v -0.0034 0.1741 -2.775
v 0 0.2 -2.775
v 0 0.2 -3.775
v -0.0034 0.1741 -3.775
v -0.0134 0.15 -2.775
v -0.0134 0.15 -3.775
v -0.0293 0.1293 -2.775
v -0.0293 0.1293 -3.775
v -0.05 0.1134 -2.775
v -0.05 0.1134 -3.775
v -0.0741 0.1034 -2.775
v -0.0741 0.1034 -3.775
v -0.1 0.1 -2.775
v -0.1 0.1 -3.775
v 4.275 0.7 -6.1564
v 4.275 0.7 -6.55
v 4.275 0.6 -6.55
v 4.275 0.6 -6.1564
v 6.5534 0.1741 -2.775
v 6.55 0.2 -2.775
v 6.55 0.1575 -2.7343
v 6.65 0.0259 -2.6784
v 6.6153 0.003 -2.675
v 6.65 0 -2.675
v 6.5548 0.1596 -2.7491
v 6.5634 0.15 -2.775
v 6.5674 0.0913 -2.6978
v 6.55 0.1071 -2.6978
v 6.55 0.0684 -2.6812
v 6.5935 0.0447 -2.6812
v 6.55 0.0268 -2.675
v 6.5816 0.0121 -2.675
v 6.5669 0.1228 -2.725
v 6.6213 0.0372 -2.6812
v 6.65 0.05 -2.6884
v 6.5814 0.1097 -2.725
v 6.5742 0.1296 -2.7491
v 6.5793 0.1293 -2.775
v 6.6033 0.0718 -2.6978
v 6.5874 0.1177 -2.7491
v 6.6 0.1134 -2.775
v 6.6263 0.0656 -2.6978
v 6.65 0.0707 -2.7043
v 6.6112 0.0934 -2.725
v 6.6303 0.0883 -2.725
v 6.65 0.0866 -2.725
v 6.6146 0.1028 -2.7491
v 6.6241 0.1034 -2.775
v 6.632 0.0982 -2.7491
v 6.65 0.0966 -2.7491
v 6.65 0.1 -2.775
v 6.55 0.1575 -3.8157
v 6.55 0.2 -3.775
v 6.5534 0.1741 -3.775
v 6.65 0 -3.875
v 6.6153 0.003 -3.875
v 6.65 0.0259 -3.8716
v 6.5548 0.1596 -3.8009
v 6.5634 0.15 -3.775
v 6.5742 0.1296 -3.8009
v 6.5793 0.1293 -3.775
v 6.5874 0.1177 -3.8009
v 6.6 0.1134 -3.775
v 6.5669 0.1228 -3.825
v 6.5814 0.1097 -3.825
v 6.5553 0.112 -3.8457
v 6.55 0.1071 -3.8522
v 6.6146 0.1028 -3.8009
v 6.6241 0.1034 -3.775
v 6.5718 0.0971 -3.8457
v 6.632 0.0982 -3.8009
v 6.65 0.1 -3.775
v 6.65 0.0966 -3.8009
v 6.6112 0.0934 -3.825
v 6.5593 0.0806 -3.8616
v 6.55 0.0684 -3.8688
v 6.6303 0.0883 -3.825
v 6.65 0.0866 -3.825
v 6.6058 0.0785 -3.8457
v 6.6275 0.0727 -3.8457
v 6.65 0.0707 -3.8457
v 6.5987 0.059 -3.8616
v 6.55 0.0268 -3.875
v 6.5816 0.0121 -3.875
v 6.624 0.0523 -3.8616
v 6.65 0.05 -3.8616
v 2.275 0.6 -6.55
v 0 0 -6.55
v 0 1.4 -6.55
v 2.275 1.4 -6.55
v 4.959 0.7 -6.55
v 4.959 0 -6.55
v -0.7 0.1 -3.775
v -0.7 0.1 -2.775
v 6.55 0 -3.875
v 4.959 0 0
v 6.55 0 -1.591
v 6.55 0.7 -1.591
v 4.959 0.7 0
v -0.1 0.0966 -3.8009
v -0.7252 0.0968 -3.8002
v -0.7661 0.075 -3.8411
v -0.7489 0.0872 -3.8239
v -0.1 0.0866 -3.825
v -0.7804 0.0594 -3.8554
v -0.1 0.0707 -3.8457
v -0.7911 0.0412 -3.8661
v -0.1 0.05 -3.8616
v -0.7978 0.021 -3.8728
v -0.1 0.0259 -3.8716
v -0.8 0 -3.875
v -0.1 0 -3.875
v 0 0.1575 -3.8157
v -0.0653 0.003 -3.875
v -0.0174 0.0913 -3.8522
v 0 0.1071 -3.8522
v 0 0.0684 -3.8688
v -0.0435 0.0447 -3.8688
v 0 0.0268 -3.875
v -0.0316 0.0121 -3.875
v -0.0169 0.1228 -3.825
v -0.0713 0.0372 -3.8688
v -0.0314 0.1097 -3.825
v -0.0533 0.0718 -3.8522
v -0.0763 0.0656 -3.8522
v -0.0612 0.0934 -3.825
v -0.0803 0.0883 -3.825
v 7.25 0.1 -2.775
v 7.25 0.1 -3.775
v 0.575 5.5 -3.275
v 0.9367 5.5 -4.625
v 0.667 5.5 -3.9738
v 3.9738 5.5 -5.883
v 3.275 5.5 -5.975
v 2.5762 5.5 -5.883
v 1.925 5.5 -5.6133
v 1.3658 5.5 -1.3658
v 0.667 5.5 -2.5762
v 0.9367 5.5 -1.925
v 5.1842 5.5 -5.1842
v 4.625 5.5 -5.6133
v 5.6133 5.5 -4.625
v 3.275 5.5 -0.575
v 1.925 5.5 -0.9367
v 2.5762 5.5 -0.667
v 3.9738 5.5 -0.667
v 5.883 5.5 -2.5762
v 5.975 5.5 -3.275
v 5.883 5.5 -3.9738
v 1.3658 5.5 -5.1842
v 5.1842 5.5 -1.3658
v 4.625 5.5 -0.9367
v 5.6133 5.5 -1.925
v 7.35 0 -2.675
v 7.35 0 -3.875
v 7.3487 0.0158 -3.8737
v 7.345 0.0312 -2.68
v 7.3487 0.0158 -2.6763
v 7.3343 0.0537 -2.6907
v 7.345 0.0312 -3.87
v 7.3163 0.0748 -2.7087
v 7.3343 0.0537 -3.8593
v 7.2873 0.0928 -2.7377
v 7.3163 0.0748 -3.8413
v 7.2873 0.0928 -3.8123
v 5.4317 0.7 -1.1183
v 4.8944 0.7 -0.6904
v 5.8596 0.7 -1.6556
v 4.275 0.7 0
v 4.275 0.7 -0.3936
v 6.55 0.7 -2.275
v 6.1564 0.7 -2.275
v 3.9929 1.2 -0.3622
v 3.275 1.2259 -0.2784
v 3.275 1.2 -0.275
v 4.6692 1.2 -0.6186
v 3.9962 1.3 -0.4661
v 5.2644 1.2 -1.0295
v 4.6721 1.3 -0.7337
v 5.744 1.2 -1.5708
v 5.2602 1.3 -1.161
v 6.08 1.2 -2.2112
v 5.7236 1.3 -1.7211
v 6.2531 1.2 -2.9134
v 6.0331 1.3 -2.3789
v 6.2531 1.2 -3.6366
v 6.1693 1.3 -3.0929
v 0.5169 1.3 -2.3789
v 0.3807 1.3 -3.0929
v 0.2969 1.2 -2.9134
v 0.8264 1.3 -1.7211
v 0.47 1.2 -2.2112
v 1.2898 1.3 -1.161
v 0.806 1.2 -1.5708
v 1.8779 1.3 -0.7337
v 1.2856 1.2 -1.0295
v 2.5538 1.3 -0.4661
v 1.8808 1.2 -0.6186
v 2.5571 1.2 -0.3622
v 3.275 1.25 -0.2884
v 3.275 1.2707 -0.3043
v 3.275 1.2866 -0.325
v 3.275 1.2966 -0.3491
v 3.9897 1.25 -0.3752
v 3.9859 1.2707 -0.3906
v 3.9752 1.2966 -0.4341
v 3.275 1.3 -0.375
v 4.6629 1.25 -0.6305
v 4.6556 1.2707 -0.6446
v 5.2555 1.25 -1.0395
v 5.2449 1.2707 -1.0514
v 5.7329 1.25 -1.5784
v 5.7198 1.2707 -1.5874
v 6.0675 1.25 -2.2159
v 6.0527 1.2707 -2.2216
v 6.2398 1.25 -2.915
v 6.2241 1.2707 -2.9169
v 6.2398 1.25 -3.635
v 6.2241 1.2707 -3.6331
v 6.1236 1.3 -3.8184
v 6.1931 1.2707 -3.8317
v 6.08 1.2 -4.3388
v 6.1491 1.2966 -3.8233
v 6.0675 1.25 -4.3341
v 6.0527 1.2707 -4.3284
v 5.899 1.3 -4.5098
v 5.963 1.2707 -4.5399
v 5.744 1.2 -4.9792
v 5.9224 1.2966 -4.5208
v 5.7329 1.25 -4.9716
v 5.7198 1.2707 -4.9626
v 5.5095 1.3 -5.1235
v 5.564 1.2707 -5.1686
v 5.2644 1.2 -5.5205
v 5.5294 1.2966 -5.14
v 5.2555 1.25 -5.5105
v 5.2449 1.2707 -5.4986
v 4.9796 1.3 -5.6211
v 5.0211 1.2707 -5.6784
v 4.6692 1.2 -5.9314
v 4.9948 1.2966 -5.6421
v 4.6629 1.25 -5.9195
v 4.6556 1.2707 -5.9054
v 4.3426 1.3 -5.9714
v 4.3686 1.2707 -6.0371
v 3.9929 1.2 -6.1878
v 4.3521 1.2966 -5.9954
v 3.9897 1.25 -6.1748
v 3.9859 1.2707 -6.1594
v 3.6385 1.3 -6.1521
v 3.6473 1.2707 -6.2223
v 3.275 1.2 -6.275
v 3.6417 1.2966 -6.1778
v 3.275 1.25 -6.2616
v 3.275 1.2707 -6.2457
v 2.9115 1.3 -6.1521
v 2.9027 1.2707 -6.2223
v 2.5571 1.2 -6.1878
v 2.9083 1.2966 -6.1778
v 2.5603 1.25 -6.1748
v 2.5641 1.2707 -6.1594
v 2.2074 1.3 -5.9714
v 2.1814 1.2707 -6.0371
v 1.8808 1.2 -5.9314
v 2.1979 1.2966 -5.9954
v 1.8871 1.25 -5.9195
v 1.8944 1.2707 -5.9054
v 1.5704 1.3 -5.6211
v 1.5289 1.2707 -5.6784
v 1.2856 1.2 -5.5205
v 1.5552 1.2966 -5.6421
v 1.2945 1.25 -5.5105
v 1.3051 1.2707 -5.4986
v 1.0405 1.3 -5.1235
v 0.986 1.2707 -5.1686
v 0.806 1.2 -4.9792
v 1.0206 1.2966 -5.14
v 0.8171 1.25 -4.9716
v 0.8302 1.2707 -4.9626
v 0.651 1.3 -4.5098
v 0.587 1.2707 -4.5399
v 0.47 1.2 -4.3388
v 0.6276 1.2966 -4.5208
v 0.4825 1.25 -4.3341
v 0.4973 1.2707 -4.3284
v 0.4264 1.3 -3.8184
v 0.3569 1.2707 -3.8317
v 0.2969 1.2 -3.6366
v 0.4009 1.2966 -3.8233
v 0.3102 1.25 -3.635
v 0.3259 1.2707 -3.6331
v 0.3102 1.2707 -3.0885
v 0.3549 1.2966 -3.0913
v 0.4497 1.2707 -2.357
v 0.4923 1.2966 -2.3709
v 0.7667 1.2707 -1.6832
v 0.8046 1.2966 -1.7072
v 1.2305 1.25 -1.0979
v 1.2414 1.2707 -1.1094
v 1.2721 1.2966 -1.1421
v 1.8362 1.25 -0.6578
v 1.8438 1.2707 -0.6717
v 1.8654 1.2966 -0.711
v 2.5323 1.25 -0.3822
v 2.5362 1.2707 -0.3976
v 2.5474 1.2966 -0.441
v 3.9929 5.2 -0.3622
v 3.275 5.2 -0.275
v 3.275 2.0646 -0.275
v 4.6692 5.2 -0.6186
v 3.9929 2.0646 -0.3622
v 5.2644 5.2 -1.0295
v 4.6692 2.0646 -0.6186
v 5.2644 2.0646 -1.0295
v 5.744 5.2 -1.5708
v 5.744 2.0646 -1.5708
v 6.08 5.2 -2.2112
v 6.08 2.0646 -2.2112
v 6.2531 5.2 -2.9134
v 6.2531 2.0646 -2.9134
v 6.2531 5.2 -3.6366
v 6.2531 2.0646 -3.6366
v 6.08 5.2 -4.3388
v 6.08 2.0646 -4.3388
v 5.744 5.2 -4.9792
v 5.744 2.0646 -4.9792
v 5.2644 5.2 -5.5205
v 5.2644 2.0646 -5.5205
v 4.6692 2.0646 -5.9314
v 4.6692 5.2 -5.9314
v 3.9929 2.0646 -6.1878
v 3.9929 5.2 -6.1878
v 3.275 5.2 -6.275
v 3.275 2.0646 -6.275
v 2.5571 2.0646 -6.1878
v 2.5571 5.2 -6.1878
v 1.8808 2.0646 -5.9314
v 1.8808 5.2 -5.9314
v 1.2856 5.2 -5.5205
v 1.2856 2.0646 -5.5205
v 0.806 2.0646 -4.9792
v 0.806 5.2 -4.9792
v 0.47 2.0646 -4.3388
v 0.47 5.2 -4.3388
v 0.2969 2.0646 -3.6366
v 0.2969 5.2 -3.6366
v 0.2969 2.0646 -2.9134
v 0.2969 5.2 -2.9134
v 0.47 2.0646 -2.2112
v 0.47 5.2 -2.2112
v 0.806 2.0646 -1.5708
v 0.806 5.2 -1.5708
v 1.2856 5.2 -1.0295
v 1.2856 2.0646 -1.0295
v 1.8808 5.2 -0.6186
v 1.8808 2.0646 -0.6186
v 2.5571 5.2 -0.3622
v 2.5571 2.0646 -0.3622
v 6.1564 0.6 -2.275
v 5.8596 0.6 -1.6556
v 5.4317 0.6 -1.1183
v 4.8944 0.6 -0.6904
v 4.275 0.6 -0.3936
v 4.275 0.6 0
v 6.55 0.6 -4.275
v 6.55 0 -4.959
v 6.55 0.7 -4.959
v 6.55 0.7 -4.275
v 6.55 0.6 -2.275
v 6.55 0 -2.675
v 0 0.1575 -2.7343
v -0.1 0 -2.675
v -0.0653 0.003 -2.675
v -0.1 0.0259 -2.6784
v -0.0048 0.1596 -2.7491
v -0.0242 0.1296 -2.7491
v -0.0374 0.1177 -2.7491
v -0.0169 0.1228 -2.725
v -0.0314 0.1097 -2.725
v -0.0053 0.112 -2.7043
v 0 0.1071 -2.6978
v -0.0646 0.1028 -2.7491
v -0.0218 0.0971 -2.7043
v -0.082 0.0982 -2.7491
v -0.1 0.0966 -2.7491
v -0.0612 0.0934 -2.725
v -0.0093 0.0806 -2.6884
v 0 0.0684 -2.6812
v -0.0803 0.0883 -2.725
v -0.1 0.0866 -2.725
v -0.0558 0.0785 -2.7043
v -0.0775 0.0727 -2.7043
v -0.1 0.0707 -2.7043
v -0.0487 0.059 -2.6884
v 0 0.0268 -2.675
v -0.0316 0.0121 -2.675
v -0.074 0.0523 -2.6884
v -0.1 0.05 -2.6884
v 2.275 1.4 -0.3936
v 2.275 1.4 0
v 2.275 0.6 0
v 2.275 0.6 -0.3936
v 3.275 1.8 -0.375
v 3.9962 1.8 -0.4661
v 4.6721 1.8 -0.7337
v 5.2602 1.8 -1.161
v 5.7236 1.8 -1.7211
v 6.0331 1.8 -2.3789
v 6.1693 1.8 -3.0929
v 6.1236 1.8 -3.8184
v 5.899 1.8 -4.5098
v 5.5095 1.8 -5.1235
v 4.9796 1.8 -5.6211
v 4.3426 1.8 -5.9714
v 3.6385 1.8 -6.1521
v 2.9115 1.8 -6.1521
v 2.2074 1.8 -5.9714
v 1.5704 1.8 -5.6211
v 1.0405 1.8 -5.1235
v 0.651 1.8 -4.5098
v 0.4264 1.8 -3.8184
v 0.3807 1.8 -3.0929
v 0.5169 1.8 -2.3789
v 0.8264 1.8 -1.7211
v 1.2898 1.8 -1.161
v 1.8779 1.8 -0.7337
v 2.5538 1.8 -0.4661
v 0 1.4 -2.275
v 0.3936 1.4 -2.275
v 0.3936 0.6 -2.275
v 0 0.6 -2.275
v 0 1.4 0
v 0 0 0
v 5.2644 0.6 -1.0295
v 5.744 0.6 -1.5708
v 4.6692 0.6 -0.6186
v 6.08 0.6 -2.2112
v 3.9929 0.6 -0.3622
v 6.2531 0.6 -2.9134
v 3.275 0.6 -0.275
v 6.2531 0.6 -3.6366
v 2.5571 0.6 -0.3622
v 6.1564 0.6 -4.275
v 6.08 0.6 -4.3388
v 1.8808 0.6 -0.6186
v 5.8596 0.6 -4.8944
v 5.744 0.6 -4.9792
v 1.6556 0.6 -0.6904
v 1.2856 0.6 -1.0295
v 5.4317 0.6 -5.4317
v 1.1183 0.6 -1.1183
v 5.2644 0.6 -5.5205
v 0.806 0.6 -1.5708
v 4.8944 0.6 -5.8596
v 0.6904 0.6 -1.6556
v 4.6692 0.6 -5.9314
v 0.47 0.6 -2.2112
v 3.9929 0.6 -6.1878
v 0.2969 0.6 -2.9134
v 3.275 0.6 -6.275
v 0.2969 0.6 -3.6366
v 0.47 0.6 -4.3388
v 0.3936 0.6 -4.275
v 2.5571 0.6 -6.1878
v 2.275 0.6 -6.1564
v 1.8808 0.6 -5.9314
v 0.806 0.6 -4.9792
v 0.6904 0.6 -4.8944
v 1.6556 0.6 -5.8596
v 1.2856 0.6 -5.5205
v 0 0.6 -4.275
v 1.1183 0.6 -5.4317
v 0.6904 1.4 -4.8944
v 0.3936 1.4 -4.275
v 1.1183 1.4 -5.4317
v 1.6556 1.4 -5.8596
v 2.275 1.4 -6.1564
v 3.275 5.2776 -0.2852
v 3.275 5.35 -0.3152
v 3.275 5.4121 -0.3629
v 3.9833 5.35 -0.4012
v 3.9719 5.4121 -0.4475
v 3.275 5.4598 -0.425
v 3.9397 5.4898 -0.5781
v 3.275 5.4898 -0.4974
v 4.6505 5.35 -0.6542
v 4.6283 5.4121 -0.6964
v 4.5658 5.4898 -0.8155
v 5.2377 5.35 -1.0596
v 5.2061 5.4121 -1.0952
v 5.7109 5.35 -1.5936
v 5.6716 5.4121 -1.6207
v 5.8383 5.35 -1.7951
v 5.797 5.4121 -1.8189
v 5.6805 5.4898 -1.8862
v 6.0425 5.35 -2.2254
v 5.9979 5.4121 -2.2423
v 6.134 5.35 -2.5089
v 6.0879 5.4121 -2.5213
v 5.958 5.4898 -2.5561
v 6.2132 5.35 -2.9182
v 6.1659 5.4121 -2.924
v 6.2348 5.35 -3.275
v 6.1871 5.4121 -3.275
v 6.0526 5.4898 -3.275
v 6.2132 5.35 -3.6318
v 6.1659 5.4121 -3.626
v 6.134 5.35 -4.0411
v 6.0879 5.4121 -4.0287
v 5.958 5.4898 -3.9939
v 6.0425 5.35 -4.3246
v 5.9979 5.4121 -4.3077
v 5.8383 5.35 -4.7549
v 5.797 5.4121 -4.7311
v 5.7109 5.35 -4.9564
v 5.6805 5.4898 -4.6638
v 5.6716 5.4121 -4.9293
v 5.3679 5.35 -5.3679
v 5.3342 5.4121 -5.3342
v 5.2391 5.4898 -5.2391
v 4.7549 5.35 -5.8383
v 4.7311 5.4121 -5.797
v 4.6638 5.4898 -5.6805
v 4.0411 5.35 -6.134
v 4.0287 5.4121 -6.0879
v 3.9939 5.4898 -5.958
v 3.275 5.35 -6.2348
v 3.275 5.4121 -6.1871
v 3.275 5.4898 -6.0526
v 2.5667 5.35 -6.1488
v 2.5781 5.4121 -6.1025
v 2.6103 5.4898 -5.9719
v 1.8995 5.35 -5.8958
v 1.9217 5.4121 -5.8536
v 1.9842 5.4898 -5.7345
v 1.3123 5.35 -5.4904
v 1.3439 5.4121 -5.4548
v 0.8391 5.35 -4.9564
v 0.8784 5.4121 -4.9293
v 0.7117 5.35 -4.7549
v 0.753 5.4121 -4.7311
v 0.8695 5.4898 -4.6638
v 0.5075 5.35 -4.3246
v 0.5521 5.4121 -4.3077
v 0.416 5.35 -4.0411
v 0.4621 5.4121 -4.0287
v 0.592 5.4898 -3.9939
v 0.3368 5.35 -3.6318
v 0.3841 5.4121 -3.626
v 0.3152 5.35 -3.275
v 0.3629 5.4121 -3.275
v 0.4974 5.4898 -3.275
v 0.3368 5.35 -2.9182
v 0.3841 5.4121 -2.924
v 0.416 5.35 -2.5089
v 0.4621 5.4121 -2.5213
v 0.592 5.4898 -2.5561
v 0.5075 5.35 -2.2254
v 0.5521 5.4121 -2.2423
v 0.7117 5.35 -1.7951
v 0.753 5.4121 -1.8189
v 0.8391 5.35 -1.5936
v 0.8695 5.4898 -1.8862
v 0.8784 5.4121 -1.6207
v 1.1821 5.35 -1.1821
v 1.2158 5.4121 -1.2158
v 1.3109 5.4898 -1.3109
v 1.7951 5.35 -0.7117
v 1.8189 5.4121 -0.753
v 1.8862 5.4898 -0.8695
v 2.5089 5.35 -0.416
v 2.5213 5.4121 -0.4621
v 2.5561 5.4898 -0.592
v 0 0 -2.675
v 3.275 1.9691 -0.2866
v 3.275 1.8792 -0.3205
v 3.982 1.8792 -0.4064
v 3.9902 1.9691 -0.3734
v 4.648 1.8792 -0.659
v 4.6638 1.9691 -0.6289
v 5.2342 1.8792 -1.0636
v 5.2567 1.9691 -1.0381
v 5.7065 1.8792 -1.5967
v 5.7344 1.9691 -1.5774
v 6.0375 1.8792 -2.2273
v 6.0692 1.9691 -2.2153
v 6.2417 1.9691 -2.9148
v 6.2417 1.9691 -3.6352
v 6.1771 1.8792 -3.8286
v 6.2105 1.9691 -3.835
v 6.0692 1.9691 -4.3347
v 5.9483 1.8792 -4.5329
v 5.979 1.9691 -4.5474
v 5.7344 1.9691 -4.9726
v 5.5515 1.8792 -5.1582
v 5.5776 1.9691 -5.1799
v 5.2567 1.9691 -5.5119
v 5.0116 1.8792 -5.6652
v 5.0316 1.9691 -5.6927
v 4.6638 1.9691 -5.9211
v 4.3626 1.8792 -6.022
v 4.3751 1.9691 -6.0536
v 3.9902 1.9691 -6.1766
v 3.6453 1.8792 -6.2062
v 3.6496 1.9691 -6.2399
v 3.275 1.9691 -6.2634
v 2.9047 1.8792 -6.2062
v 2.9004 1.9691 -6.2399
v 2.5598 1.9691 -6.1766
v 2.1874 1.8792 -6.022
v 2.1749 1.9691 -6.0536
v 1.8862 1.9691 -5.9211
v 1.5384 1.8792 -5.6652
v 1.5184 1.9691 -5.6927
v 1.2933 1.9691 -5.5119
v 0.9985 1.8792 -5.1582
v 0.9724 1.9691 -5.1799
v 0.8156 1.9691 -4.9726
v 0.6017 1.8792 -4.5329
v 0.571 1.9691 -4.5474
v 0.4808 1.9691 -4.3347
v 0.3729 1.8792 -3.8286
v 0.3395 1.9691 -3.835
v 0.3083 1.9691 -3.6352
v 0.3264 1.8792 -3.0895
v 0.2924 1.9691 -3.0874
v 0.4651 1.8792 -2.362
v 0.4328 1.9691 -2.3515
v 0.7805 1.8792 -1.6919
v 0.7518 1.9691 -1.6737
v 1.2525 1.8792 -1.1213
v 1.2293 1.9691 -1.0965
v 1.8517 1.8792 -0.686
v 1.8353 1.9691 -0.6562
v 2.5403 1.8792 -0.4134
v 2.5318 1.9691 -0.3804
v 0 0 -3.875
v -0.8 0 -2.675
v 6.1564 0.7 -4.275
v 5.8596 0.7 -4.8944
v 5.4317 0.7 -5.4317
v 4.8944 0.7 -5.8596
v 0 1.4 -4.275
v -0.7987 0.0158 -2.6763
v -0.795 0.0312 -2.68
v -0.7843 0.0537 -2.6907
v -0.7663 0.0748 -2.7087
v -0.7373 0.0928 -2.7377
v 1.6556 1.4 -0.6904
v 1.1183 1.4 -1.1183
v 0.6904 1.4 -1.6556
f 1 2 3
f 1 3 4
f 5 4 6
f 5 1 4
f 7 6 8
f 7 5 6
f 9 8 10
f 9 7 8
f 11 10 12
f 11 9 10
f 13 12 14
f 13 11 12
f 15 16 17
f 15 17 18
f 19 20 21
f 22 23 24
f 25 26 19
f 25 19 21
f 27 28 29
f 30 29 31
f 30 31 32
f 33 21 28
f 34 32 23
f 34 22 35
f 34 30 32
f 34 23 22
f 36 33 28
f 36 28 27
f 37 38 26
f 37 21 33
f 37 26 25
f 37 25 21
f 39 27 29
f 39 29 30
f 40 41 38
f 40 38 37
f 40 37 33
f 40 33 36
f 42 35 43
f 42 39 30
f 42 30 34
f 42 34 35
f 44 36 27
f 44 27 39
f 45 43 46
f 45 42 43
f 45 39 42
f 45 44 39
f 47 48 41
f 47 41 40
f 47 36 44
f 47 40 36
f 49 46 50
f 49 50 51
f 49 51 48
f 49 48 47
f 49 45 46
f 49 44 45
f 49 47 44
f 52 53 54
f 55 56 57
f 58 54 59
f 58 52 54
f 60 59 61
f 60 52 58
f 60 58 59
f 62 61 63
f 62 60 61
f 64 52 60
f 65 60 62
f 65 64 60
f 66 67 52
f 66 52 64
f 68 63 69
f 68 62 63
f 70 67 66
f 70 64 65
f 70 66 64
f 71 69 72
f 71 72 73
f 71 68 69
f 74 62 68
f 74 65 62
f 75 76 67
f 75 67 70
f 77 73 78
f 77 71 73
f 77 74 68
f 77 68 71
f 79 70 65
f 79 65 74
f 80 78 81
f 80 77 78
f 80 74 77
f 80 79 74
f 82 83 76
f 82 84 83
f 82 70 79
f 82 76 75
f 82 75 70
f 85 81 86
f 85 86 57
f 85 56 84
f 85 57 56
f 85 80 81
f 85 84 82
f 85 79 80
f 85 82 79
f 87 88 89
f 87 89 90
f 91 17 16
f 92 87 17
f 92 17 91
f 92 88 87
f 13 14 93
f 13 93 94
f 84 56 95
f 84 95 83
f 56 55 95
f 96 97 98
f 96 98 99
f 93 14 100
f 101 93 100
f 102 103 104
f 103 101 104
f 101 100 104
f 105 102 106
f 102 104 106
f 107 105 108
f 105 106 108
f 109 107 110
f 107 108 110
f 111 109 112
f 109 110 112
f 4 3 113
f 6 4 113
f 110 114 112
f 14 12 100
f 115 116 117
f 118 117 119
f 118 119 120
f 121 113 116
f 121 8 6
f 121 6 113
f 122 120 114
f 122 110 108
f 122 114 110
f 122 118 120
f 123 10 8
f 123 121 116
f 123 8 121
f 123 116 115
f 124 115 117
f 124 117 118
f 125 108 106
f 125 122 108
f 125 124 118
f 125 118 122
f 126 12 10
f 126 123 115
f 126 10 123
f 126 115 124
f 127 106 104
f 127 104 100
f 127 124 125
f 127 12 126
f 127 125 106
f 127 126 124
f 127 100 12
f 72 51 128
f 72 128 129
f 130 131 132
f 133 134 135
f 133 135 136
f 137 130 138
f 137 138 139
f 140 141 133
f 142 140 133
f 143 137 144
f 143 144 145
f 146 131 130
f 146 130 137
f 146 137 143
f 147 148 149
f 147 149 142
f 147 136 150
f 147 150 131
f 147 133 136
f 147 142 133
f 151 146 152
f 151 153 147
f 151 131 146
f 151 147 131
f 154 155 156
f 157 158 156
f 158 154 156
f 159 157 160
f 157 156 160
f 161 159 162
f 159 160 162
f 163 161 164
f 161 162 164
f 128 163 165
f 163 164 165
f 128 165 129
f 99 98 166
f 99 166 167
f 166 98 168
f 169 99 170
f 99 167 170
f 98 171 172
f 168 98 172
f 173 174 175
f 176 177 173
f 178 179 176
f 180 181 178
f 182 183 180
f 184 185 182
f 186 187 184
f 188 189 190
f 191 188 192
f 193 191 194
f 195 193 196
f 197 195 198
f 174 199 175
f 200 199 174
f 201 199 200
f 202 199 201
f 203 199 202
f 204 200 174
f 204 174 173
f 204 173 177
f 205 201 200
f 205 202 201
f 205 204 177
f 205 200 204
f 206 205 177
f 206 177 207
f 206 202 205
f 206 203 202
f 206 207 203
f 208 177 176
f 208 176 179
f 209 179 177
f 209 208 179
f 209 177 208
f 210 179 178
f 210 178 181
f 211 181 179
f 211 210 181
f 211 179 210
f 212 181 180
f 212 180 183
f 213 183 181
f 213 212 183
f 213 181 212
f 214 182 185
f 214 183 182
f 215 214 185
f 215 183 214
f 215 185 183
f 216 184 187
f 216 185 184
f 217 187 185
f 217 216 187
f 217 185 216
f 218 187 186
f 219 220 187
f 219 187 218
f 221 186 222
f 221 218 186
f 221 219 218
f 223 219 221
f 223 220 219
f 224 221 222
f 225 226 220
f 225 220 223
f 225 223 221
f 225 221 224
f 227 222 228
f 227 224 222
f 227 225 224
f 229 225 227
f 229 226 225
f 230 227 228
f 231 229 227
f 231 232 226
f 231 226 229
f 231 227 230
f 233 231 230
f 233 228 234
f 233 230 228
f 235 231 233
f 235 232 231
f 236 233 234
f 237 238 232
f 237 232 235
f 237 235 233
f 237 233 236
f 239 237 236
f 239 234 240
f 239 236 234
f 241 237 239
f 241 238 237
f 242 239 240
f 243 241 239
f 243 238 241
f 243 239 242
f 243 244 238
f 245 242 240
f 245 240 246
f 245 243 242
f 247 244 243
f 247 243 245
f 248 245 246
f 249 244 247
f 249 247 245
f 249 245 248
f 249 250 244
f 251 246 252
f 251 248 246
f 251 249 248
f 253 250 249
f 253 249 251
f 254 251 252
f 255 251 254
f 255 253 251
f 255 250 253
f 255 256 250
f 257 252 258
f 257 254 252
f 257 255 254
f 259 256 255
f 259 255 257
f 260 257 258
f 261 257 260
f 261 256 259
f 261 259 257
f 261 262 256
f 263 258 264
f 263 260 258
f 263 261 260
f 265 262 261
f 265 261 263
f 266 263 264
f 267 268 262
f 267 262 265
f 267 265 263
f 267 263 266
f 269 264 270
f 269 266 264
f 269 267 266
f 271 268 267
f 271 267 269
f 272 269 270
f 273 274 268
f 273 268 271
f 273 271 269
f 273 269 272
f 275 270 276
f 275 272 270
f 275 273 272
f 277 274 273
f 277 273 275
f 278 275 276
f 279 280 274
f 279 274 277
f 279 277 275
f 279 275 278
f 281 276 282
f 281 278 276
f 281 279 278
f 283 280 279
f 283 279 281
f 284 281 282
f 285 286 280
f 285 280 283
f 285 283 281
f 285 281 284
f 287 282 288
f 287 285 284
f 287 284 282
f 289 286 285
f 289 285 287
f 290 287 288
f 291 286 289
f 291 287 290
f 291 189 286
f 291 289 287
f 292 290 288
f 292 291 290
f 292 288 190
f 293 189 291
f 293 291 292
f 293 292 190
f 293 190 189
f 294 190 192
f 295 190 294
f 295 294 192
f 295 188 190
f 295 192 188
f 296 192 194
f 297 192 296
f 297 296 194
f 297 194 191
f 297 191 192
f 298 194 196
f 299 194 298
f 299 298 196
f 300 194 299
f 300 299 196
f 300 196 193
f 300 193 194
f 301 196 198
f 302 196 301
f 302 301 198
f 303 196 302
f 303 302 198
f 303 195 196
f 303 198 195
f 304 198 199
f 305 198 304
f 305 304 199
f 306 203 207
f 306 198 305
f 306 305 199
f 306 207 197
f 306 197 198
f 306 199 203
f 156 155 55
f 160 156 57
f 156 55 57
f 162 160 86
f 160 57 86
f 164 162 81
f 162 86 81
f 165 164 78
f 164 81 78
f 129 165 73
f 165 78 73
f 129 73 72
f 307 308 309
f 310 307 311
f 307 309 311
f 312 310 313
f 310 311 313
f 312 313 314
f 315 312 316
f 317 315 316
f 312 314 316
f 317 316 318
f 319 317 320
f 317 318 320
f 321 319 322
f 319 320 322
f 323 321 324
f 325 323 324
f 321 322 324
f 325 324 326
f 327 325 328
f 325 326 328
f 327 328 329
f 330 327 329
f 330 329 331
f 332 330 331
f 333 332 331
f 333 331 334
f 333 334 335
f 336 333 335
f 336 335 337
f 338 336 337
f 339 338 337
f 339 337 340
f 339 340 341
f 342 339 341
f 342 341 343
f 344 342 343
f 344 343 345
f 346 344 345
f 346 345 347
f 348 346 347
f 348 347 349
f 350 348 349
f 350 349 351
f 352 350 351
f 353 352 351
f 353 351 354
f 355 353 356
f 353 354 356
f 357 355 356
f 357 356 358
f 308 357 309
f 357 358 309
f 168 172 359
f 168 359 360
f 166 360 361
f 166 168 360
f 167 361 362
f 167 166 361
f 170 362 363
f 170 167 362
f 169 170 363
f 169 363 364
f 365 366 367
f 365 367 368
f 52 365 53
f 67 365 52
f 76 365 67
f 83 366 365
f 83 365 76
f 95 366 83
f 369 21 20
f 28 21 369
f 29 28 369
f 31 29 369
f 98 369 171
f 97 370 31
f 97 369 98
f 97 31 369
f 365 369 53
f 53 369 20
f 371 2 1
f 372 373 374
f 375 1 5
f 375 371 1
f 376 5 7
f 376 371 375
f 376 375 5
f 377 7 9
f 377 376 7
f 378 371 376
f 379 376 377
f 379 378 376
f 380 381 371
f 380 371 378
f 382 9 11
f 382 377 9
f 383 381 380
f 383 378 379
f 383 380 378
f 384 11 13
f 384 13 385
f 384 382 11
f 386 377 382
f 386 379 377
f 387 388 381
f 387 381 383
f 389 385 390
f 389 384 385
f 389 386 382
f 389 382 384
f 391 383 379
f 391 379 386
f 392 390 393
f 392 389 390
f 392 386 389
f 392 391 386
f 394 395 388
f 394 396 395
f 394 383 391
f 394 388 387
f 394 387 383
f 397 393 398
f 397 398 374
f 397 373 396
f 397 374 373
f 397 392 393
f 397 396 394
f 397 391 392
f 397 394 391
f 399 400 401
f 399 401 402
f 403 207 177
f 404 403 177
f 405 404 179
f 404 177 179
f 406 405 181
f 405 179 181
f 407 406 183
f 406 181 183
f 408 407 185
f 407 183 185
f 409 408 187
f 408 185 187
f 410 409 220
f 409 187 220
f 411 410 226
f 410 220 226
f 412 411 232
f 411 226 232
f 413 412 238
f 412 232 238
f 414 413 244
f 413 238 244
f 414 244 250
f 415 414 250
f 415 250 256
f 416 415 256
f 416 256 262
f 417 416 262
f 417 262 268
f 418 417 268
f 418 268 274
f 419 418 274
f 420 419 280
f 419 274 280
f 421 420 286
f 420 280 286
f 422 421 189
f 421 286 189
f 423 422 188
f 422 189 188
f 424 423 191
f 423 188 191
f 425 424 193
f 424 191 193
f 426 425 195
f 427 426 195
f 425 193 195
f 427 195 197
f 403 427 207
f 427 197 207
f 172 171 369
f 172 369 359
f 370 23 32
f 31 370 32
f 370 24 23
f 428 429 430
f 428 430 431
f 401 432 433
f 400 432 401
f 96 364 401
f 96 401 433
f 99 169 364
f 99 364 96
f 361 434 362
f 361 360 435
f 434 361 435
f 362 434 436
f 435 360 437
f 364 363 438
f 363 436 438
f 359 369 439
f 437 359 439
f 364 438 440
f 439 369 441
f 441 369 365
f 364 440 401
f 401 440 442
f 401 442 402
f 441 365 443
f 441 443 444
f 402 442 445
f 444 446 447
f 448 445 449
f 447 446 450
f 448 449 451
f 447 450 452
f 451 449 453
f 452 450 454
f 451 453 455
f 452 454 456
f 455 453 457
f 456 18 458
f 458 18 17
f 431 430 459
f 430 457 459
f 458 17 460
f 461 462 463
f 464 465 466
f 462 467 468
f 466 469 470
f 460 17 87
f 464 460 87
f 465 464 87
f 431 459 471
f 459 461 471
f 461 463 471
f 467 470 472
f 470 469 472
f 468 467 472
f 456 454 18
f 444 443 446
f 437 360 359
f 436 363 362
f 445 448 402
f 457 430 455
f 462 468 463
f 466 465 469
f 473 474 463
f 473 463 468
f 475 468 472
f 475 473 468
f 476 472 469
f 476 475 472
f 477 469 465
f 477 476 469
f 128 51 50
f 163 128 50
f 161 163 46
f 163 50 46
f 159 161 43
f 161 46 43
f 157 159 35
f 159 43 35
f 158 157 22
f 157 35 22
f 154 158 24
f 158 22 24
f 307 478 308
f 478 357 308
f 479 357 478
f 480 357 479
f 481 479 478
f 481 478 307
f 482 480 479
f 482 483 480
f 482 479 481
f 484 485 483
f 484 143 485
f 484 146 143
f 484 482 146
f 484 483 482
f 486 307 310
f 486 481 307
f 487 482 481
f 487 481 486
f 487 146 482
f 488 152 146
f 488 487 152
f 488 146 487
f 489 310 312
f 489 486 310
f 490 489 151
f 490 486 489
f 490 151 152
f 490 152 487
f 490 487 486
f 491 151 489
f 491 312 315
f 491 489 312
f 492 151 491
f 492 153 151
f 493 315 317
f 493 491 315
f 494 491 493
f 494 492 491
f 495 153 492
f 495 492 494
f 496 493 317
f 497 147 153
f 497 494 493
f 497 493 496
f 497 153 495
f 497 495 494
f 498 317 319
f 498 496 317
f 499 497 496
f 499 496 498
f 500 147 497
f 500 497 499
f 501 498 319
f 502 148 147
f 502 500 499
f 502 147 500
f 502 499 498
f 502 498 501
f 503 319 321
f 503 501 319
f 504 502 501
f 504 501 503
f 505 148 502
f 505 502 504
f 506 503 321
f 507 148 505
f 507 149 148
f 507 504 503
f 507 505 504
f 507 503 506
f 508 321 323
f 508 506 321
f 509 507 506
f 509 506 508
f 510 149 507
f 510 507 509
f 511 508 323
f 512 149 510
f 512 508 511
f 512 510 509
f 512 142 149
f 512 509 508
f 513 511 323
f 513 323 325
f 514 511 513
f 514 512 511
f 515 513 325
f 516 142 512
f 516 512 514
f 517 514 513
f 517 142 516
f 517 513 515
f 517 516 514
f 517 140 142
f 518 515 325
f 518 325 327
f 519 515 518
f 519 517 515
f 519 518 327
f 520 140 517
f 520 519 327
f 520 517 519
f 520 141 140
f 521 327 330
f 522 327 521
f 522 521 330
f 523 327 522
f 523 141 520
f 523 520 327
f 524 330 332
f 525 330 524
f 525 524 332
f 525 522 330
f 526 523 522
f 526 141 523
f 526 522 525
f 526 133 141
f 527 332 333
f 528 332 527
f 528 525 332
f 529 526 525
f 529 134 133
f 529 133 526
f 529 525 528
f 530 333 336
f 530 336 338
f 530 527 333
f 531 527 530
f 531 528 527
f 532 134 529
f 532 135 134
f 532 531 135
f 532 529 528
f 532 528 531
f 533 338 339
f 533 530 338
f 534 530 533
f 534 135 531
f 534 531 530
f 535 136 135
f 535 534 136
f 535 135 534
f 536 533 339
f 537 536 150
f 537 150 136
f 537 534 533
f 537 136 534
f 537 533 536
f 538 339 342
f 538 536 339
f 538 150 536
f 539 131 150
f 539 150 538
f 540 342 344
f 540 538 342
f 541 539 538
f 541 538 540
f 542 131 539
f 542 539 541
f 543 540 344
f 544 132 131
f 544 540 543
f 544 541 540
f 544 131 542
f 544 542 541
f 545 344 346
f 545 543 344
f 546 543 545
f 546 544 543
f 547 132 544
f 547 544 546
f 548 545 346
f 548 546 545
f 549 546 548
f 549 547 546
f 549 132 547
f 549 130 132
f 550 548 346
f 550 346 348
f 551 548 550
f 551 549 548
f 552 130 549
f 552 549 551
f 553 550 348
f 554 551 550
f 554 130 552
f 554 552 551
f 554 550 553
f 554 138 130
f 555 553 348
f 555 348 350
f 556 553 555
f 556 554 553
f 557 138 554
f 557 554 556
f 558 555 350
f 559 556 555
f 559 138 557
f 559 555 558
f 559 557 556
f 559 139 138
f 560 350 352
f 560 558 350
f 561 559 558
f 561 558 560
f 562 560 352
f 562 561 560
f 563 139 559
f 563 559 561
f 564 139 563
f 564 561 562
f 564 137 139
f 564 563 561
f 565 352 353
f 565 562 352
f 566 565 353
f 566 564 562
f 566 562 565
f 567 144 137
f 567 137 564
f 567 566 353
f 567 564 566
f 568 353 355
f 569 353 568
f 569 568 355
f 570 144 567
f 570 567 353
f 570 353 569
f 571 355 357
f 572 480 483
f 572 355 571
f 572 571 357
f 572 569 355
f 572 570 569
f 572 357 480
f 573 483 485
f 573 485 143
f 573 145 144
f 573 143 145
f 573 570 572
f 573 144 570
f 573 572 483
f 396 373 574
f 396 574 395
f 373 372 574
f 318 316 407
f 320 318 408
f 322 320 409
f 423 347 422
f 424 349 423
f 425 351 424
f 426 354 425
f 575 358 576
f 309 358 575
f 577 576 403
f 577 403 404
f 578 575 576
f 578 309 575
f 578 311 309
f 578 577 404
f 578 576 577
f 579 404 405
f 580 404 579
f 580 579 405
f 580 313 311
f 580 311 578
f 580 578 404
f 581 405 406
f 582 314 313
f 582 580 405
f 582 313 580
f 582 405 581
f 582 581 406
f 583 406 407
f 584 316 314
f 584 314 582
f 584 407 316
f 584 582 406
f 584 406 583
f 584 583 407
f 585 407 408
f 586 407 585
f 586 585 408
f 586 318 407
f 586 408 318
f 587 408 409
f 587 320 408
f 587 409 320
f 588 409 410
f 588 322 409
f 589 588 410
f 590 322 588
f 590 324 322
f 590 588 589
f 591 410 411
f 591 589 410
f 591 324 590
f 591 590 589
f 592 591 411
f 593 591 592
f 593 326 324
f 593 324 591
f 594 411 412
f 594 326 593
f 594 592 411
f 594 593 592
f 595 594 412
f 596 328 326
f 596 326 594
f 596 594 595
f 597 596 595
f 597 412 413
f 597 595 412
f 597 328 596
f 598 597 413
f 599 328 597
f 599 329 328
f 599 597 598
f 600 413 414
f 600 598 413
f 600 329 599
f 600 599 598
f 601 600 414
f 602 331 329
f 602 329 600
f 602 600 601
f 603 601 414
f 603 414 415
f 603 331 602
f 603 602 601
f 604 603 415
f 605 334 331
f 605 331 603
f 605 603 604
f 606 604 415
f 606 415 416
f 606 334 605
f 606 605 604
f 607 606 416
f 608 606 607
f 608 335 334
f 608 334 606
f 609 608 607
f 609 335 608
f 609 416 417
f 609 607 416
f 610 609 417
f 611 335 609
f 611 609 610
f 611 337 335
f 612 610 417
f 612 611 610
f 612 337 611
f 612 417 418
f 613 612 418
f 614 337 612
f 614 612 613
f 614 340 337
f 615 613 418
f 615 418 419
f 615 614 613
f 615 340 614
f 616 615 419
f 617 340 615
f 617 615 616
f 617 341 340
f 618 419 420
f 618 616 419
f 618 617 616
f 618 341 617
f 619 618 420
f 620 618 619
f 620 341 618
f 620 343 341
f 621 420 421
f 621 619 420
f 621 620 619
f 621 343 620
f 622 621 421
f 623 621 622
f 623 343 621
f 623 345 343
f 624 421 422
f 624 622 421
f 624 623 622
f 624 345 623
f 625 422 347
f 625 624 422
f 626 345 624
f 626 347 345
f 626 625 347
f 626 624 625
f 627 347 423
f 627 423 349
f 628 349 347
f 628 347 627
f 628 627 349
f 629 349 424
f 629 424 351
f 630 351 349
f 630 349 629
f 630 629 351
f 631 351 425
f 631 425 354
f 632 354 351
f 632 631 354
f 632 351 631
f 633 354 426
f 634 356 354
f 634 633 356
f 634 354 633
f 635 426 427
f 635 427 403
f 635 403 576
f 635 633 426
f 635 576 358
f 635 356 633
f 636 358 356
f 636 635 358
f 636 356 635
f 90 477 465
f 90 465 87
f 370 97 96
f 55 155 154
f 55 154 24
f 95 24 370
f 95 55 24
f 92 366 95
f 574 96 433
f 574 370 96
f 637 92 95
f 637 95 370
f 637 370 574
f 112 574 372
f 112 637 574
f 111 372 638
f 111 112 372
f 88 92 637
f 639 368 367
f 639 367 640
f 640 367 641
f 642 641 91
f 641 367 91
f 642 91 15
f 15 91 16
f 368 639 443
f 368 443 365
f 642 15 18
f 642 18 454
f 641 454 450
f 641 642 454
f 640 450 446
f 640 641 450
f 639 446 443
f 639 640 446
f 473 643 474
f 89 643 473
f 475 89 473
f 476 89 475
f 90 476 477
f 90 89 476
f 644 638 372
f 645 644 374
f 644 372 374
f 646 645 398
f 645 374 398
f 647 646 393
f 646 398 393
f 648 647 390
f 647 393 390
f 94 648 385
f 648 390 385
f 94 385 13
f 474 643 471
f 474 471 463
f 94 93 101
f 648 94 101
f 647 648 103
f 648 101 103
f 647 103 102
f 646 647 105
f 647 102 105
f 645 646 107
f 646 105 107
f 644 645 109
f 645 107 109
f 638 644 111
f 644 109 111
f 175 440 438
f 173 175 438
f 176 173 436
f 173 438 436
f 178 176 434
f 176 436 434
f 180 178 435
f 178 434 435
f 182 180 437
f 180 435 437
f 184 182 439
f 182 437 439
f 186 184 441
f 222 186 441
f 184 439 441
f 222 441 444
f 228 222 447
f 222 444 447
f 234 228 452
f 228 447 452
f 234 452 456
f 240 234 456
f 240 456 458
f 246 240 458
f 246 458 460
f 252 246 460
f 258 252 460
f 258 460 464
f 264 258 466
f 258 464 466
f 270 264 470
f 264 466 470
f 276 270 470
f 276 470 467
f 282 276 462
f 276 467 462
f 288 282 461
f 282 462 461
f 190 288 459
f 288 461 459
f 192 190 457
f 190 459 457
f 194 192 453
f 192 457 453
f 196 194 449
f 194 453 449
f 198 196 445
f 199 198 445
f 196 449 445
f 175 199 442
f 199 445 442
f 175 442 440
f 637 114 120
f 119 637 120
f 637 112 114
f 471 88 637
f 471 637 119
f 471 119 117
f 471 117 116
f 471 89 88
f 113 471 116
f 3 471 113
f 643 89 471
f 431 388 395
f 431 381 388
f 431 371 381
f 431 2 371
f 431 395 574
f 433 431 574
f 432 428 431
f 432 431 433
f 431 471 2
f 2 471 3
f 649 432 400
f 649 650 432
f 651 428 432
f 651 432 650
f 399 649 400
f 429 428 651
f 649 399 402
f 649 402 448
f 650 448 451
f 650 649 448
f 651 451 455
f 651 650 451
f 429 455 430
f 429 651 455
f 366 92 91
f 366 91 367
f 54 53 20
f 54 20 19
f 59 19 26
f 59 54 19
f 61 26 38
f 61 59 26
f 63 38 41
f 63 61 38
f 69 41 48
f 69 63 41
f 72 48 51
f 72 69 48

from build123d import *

# Parameters (mm, degrees)
BOSS_EXTRU_1_DEPTH      = 0.7
ENL_V_MAT_EXTRU_1_DEPTH = 0.1
BOSS_EXTRU_2_START      = 0.7
BOSS_EXTRU_2_DEPTH      = 0.7
ESQUISSE4_R             = 3
BOSS_EXTRU_3_DEPTH      = 0.7
CONG_1_R                = 0.1
ESQUISSE5_R             = 2.9
BOSS_EXTRU_4_DEPTH      = 0.5
ESQUISSE6_R             = 3
BOSS_EXTRU_5_DEPTH      = 3.7
CONG_2_R                = 0.4
CONG_3_R                = 0.3
ESQUISSE7_W             = 1.2
ESQUISSE7_H             = 0.1
BOSS_EXTRU_6_DEPTH      = 0.8
CONG_4_R                = 0.1
CONG_5_R                = 0.1
ESQUISSE8_W             = 1.2
ESQUISSE8_H             = 0.1
BOSS_EXTRU_7_DEPTH      = 0.8
CONG_6_R                = 0.1
CONG_7_R                = 0.1


with BuildPart() as part:
    # Esquisse1 → Boss.-Extru.1 (new body)
    with BuildSketch(Plane(origin=(0, 0, 0), x_dir=(1, 0, 0), z_dir=(0, 1, 0))):
        Polygon((4.959009742, 6.55), (6.55, 4.959009742), (6.55, 1.590990258), (4.959009742, 0), (0, 0), (0, 6.55), align=None)
    extrude(amount=BOSS_EXTRU_1_DEPTH)

    # Esquisse2 → Enlèv. mat.-Extru.1 (cut)
    with BuildSketch(Plane(origin=(0, 0.7, 0), x_dir=(1, 0, 0), z_dir=(0, 1, 0))):
        with BuildLine():
            Line((2.275, 6.55), (4.275, 6.55))
            Line((4.275, 6.55), (4.275, 6.156405907))
            ThreePointArc((4.275, 6.156405907), (5.431675683, 5.431675683), (6.156405907, 4.275))
            Line((6.156405907, 4.275), (6.55, 4.275))
            Line((6.55, 4.275), (6.55, 2.275))
            Line((6.55, 2.275), (6.156405907, 2.275))
            ThreePointArc((6.156405907, 2.275), (5.431675683, 1.118324317), (4.275, 0.393594093))
            Line((4.275, 0.393594093), (4.275, 0))
            Line((4.275, 0), (2.275, 0))
            Line((2.275, 0), (2.275, 0.393594093))
            ThreePointArc((2.275, 0.393594093), (1.118324317, 1.118324317), (0.393594093, 2.275))
            Line((0.393594093, 2.275), (0, 2.275))
            Line((0, 2.275), (0, 4.275))
            Line((0, 4.275), (0.393594093, 4.275))
            ThreePointArc((0.393594093, 4.275), (1.118324317, 5.431675683), (2.275, 6.156405907))
            Line((2.275, 6.156405907), (2.275, 6.55))
        make_face()
    extrude(amount=-ENL_V_MAT_EXTRU_1_DEPTH, mode=Mode.SUBTRACT)

    # Esquisse3 → Boss.-Extru.2 (add)
    with BuildSketch(Plane(origin=(0, 0.7, 0), x_dir=(1, 0, 0), z_dir=(0, 1, 0)).offset(BOSS_EXTRU_2_START)):
        with BuildLine():
            Line((0, 0), (2.275, 0))
            Line((2.275, 0), (2.275, 0.393594093))
            ThreePointArc((2.275, 0.393594093), (1.118324317, 1.118324317), (0.393594093, 2.275))
            Line((0.393594093, 2.275), (0, 2.275))
            Line((0, 2.275), (0, 0))
        make_face()
        with BuildLine():
            Line((0, 6.55), (0, 4.275))
            Line((0, 4.275), (0.393594093, 4.275))
            ThreePointArc((0.393594093, 4.275), (1.118324317, 5.431675683), (2.275, 6.156405907))
            Line((2.275, 6.156405907), (2.275, 6.55))
            Line((2.275, 6.55), (0, 6.55))
        make_face()
    extrude(amount=-BOSS_EXTRU_2_DEPTH)

    # Esquisse4 → Boss.-Extru.3 (add)
    with BuildSketch(Plane(origin=(0, 0.6, 0), x_dir=(1, 0, 0), z_dir=(0, 1, 0))):
        with Locations(Location((3.275, 3.275, 0), (0, 0, 270))):
            Circle(ESQUISSE4_R)
    extrude(amount=BOSS_EXTRU_3_DEPTH)

    # Congé1
    cong_1_edges = [part.edges().sort_by_distance(p)[0] for p in [
        (3.275, 1.3, -6.275),
    ]]
    fillet(cong_1_edges, radius=CONG_1_R)

    # Esquisse5 → Boss.-Extru.4 (add)
    with BuildSketch(Plane(origin=(0, 1.3, 0), x_dir=(1, 0, 0), z_dir=(0, 1, 0))):
        with Locations(Location((3.275, 3.275, 0), (0, 0, 270))):
            Circle(ESQUISSE5_R)
    extrude(amount=BOSS_EXTRU_4_DEPTH)

    # Esquisse6 → Boss.-Extru.5 (add)
    with BuildSketch(Plane(origin=(0, 1.8, 0), x_dir=(1, 0, 0), z_dir=(0, 1, 0))):
        with Locations(Location((3.275, 3.275, 0), (0, 0, 270))):
            Circle(ESQUISSE6_R)
    extrude(amount=BOSS_EXTRU_5_DEPTH)

    # Congé2
    # the kernel refuses this fillet: 0.4 mm, written as the material it takes off along each edge
    with BuildSketch(Plane(origin=(3.275, 1.8, -3.275), x_dir=(0, 0, 1), z_dir=(-1, 0, 0))) as cong_2_piece_1:
        with BuildLine():
            CenterArc((2.6, 0.264575131), CONG_2_R, 318.590377891, 41.409622109)
            Line((2.9, 0), (2.906, -0.005291503))
            ThreePointArc((2.906, -0.005291503), (2.95, -0.008), (3, -0.008))
            Line((3, -0.008), (3.008, 0))
            Line((3.008, 0), (3.008, 0.264575131))
            Line((3.008, 0.264575131), (3, 0.264575131))
        make_face()
    revolve(axis=Axis((3.275, 1.8, -3.275), (0, 1, 0)), mode=Mode.SUBTRACT)

    # Congé3
    cong_3_edges = [part.edges().sort_by_distance(p)[0] for p in [
        (3.275, 5.5, -6.275),
    ]]
    fillet(cong_3_edges, radius=CONG_3_R)

    # Esquisse7 → Boss.-Extru.6 (add)
    with BuildSketch(Plane(origin=(6.55, 0, 0), x_dir=(0, 0, -1), z_dir=(1, 0, 0))):
        with Locations((3.275, 0.05)):
            Rectangle(ESQUISSE7_W, ESQUISSE7_H)
    extrude(amount=BOSS_EXTRU_6_DEPTH)

    # Congé4
    cong_4_edges = [part.edges().sort_by_distance(p)[0] for p in [
        (6.55, 0.1, -3.275),
    ]]
    fillet(cong_4_edges, radius=CONG_4_R)

    # Congé5
    # the kernel refuses this fillet: 0.1 mm, written as the material it takes off along each edge
    with BuildSketch(Plane(origin=(6.65, 0.2, -3.875), x_dir=(0.8017442392976484, 0.5976672776328275, 0), z_dir=(0.5976672776328275, -0.8017442392976484, 0))) as cong_5_piece_1_section:
        with BuildLine():
            CenterArc((0.1 + CONG_5_R, CONG_5_R), CONG_5_R, 180, 90)
            Line((0.1 + CONG_5_R, 0), (0.1, 0))
            Line((0.1, 0), (0.1, CONG_5_R))
        make_face()
    cong_5_piece_1 = revolve(axis=Axis((6.65, 0.2, -3.875), (0, 0, 1)), revolution_arc=233.296989237, mode=Mode.PRIVATE)
    cong_5_piece_1 = split(cong_5_piece_1, bisect_by=Plane(origin=(6.55, 0.125006103, -3.843837174), z_dir=(1, 0, 0)), keep=Keep.TOP, mode=Mode.PRIVATE)
    add(cong_5_piece_1, mode=Mode.SUBTRACT)
    with BuildSketch(Plane(origin=(6.65, 0.2, -2.675), x_dir=(0.8017442392976484, 0.5976672776328275, 0), z_dir=(0.5976672776328275, -0.8017442392976484, 0))) as cong_5_piece_2_section:
        with BuildLine():
            CenterArc((0.1 + CONG_5_R, -CONG_5_R), CONG_5_R, 90, 90)
            Line((0.1 + CONG_5_R, 0), (0.1, 0))
            Line((0.1, 0), (0.1, -CONG_5_R))
        make_face()
    cong_5_piece_2 = revolve(axis=Axis((6.65, 0.2, -2.675), (0, 0, 1)), revolution_arc=233.296989237, mode=Mode.PRIVATE)
    cong_5_piece_2 = split(cong_5_piece_2, bisect_by=Plane(origin=(6.55, 0.125006105, -2.706162828), z_dir=(1, 0, 0)), keep=Keep.TOP, mode=Mode.PRIVATE)
    add(cong_5_piece_2, mode=Mode.SUBTRACT)
    with BuildSketch(Plane(origin=(7.35, 0.1, -4.125), x_dir=(-1, 0, 0), z_dir=(0, 0, 1))) as cong_5_piece_3:
        with BuildLine():
            CenterArc((CONG_5_R, CONG_5_R), CONG_5_R, 180, 90)
            Line((0, CONG_5_R), (0, 0))
            Line((0, 0), (CONG_5_R, 0))
        make_face()
    extrude(amount=1.7, mode=Mode.SUBTRACT)
    with BuildSketch(Plane(origin=(6.65, 0.1, -3.875), x_dir=(0, 0, 1), z_dir=(1, 0, 0))) as cong_5_piece_4:
        with BuildLine():
            CenterArc((CONG_5_R, CONG_5_R), CONG_5_R, 180, 90)
            Line((0, CONG_5_R), (0, 0))
            Line((0, 0), (CONG_5_R, 0))
        make_face()
    extrude(amount=0.95, mode=Mode.SUBTRACT)
    with BuildSketch(Plane(origin=(6.65, 0.1, -2.675), x_dir=(0, 0, -1), z_dir=(1, 0, 0))) as cong_5_piece_5:
        with BuildLine():
            CenterArc((CONG_5_R, -CONG_5_R), CONG_5_R, 90, 90)
            Line((0, -CONG_5_R), (0, 0))
            Line((0, 0), (CONG_5_R, 0))
        make_face()
    extrude(amount=0.95, mode=Mode.SUBTRACT)

    # Esquisse8 → Boss.-Extru.7 (add)
    with BuildSketch(Plane.ZY):
        with Locations((-3.275, 0.05)):
            Rectangle(ESQUISSE8_W, ESQUISSE8_H)
    extrude(amount=BOSS_EXTRU_7_DEPTH)

    # Congé6
    cong_6_edges = [part.edges().sort_by_distance(p)[0] for p in [
        (0, 0.1, -3.275),
    ]]
    fillet(cong_6_edges, radius=CONG_6_R)

    # Congé7
    # the kernel refuses this fillet: 0.1 mm, written as the material it takes off along each edge
    with BuildSketch(Plane(origin=(-0.1, 0.2, -2.675), x_dir=(-0.8017442392976492, 0.5976672776328262, 0), z_dir=(-0.5976672776328262, -0.8017442392976492, 0))) as cong_7_piece_1_section:
        with BuildLine():
            CenterArc((0.1 + CONG_7_R, CONG_7_R), CONG_7_R, 180, 90)
            Line((0.1, CONG_7_R), (0.1, 0))
            Line((0.1, 0), (0.1 + CONG_7_R, 0))
        make_face()
    cong_7_piece_1 = revolve(axis=Axis((-0.1, 0.2, -2.675), (0, 0, -1)), revolution_arc=233.296989237, mode=Mode.PRIVATE)
    cong_7_piece_1 = split(cong_7_piece_1, bisect_by=Plane(origin=(0, 0.125006101, -2.706162827), z_dir=(-1, 0, 0)), keep=Keep.TOP, mode=Mode.PRIVATE)
    add(cong_7_piece_1, mode=Mode.SUBTRACT)
    with BuildSketch(Plane(origin=(-0.1, 0.2, -3.875), x_dir=(-0.801744239297649, 0.5976672776328265, 0), z_dir=(-0.5976672776328265, -0.801744239297649, 0))) as cong_7_piece_2_section:
        with BuildLine():
            CenterArc((0.1 + CONG_7_R, -CONG_7_R), CONG_7_R, 90, 90)
            Line((0.1 + CONG_7_R, 0), (0.1, 0))
            Line((0.1, 0), (0.1, -CONG_7_R))
        make_face()
    cong_7_piece_2 = revolve(axis=Axis((-0.1, 0.2, -3.875), (0, 0, -1)), revolution_arc=233.296989237, mode=Mode.PRIVATE)
    cong_7_piece_2 = split(cong_7_piece_2, bisect_by=Plane(origin=(0, 0.125006106, -3.843837173), z_dir=(-1, 0, 0)), keep=Keep.TOP, mode=Mode.PRIVATE)
    add(cong_7_piece_2, mode=Mode.SUBTRACT)
    with BuildSketch(Plane(origin=(-0.1, 0.1, -2.675), x_dir=(0, 0, -1), z_dir=(-1, 0, 0))) as cong_7_piece_3:
        with BuildLine():
            CenterArc((CONG_7_R, CONG_7_R), CONG_7_R, 180, 90)
            Line((0, CONG_7_R), (0, 0))
            Line((0, 0), (CONG_7_R, 0))
        make_face()
    extrude(amount=0.95, mode=Mode.SUBTRACT)
    with BuildSketch(Plane(origin=(-0.8, 0.1, -4.125), x_dir=(0, -1, 0), z_dir=(0, 0, 1))) as cong_7_piece_4:
        with BuildLine():
            CenterArc((CONG_7_R, CONG_7_R), CONG_7_R, 180, 90)
            Line((0, CONG_7_R), (0, 0))
            Line((0, 0), (CONG_7_R, 0))
        make_face()
    extrude(amount=1.7, mode=Mode.SUBTRACT)
    with BuildSketch(Plane(origin=(-0.1, 0.1, -3.875), x_dir=(0, 0, 1), z_dir=(-1, 0, 0))) as cong_7_piece_5:
        with BuildLine():
            CenterArc((CONG_7_R, -CONG_7_R), CONG_7_R, 90, 90)
            Line((0, -CONG_7_R), (0, 0))
            Line((0, 0), (CONG_7_R, 0))
        make_face()
    extrude(amount=0.95, mode=Mode.SUBTRACT)


solid = part.part
